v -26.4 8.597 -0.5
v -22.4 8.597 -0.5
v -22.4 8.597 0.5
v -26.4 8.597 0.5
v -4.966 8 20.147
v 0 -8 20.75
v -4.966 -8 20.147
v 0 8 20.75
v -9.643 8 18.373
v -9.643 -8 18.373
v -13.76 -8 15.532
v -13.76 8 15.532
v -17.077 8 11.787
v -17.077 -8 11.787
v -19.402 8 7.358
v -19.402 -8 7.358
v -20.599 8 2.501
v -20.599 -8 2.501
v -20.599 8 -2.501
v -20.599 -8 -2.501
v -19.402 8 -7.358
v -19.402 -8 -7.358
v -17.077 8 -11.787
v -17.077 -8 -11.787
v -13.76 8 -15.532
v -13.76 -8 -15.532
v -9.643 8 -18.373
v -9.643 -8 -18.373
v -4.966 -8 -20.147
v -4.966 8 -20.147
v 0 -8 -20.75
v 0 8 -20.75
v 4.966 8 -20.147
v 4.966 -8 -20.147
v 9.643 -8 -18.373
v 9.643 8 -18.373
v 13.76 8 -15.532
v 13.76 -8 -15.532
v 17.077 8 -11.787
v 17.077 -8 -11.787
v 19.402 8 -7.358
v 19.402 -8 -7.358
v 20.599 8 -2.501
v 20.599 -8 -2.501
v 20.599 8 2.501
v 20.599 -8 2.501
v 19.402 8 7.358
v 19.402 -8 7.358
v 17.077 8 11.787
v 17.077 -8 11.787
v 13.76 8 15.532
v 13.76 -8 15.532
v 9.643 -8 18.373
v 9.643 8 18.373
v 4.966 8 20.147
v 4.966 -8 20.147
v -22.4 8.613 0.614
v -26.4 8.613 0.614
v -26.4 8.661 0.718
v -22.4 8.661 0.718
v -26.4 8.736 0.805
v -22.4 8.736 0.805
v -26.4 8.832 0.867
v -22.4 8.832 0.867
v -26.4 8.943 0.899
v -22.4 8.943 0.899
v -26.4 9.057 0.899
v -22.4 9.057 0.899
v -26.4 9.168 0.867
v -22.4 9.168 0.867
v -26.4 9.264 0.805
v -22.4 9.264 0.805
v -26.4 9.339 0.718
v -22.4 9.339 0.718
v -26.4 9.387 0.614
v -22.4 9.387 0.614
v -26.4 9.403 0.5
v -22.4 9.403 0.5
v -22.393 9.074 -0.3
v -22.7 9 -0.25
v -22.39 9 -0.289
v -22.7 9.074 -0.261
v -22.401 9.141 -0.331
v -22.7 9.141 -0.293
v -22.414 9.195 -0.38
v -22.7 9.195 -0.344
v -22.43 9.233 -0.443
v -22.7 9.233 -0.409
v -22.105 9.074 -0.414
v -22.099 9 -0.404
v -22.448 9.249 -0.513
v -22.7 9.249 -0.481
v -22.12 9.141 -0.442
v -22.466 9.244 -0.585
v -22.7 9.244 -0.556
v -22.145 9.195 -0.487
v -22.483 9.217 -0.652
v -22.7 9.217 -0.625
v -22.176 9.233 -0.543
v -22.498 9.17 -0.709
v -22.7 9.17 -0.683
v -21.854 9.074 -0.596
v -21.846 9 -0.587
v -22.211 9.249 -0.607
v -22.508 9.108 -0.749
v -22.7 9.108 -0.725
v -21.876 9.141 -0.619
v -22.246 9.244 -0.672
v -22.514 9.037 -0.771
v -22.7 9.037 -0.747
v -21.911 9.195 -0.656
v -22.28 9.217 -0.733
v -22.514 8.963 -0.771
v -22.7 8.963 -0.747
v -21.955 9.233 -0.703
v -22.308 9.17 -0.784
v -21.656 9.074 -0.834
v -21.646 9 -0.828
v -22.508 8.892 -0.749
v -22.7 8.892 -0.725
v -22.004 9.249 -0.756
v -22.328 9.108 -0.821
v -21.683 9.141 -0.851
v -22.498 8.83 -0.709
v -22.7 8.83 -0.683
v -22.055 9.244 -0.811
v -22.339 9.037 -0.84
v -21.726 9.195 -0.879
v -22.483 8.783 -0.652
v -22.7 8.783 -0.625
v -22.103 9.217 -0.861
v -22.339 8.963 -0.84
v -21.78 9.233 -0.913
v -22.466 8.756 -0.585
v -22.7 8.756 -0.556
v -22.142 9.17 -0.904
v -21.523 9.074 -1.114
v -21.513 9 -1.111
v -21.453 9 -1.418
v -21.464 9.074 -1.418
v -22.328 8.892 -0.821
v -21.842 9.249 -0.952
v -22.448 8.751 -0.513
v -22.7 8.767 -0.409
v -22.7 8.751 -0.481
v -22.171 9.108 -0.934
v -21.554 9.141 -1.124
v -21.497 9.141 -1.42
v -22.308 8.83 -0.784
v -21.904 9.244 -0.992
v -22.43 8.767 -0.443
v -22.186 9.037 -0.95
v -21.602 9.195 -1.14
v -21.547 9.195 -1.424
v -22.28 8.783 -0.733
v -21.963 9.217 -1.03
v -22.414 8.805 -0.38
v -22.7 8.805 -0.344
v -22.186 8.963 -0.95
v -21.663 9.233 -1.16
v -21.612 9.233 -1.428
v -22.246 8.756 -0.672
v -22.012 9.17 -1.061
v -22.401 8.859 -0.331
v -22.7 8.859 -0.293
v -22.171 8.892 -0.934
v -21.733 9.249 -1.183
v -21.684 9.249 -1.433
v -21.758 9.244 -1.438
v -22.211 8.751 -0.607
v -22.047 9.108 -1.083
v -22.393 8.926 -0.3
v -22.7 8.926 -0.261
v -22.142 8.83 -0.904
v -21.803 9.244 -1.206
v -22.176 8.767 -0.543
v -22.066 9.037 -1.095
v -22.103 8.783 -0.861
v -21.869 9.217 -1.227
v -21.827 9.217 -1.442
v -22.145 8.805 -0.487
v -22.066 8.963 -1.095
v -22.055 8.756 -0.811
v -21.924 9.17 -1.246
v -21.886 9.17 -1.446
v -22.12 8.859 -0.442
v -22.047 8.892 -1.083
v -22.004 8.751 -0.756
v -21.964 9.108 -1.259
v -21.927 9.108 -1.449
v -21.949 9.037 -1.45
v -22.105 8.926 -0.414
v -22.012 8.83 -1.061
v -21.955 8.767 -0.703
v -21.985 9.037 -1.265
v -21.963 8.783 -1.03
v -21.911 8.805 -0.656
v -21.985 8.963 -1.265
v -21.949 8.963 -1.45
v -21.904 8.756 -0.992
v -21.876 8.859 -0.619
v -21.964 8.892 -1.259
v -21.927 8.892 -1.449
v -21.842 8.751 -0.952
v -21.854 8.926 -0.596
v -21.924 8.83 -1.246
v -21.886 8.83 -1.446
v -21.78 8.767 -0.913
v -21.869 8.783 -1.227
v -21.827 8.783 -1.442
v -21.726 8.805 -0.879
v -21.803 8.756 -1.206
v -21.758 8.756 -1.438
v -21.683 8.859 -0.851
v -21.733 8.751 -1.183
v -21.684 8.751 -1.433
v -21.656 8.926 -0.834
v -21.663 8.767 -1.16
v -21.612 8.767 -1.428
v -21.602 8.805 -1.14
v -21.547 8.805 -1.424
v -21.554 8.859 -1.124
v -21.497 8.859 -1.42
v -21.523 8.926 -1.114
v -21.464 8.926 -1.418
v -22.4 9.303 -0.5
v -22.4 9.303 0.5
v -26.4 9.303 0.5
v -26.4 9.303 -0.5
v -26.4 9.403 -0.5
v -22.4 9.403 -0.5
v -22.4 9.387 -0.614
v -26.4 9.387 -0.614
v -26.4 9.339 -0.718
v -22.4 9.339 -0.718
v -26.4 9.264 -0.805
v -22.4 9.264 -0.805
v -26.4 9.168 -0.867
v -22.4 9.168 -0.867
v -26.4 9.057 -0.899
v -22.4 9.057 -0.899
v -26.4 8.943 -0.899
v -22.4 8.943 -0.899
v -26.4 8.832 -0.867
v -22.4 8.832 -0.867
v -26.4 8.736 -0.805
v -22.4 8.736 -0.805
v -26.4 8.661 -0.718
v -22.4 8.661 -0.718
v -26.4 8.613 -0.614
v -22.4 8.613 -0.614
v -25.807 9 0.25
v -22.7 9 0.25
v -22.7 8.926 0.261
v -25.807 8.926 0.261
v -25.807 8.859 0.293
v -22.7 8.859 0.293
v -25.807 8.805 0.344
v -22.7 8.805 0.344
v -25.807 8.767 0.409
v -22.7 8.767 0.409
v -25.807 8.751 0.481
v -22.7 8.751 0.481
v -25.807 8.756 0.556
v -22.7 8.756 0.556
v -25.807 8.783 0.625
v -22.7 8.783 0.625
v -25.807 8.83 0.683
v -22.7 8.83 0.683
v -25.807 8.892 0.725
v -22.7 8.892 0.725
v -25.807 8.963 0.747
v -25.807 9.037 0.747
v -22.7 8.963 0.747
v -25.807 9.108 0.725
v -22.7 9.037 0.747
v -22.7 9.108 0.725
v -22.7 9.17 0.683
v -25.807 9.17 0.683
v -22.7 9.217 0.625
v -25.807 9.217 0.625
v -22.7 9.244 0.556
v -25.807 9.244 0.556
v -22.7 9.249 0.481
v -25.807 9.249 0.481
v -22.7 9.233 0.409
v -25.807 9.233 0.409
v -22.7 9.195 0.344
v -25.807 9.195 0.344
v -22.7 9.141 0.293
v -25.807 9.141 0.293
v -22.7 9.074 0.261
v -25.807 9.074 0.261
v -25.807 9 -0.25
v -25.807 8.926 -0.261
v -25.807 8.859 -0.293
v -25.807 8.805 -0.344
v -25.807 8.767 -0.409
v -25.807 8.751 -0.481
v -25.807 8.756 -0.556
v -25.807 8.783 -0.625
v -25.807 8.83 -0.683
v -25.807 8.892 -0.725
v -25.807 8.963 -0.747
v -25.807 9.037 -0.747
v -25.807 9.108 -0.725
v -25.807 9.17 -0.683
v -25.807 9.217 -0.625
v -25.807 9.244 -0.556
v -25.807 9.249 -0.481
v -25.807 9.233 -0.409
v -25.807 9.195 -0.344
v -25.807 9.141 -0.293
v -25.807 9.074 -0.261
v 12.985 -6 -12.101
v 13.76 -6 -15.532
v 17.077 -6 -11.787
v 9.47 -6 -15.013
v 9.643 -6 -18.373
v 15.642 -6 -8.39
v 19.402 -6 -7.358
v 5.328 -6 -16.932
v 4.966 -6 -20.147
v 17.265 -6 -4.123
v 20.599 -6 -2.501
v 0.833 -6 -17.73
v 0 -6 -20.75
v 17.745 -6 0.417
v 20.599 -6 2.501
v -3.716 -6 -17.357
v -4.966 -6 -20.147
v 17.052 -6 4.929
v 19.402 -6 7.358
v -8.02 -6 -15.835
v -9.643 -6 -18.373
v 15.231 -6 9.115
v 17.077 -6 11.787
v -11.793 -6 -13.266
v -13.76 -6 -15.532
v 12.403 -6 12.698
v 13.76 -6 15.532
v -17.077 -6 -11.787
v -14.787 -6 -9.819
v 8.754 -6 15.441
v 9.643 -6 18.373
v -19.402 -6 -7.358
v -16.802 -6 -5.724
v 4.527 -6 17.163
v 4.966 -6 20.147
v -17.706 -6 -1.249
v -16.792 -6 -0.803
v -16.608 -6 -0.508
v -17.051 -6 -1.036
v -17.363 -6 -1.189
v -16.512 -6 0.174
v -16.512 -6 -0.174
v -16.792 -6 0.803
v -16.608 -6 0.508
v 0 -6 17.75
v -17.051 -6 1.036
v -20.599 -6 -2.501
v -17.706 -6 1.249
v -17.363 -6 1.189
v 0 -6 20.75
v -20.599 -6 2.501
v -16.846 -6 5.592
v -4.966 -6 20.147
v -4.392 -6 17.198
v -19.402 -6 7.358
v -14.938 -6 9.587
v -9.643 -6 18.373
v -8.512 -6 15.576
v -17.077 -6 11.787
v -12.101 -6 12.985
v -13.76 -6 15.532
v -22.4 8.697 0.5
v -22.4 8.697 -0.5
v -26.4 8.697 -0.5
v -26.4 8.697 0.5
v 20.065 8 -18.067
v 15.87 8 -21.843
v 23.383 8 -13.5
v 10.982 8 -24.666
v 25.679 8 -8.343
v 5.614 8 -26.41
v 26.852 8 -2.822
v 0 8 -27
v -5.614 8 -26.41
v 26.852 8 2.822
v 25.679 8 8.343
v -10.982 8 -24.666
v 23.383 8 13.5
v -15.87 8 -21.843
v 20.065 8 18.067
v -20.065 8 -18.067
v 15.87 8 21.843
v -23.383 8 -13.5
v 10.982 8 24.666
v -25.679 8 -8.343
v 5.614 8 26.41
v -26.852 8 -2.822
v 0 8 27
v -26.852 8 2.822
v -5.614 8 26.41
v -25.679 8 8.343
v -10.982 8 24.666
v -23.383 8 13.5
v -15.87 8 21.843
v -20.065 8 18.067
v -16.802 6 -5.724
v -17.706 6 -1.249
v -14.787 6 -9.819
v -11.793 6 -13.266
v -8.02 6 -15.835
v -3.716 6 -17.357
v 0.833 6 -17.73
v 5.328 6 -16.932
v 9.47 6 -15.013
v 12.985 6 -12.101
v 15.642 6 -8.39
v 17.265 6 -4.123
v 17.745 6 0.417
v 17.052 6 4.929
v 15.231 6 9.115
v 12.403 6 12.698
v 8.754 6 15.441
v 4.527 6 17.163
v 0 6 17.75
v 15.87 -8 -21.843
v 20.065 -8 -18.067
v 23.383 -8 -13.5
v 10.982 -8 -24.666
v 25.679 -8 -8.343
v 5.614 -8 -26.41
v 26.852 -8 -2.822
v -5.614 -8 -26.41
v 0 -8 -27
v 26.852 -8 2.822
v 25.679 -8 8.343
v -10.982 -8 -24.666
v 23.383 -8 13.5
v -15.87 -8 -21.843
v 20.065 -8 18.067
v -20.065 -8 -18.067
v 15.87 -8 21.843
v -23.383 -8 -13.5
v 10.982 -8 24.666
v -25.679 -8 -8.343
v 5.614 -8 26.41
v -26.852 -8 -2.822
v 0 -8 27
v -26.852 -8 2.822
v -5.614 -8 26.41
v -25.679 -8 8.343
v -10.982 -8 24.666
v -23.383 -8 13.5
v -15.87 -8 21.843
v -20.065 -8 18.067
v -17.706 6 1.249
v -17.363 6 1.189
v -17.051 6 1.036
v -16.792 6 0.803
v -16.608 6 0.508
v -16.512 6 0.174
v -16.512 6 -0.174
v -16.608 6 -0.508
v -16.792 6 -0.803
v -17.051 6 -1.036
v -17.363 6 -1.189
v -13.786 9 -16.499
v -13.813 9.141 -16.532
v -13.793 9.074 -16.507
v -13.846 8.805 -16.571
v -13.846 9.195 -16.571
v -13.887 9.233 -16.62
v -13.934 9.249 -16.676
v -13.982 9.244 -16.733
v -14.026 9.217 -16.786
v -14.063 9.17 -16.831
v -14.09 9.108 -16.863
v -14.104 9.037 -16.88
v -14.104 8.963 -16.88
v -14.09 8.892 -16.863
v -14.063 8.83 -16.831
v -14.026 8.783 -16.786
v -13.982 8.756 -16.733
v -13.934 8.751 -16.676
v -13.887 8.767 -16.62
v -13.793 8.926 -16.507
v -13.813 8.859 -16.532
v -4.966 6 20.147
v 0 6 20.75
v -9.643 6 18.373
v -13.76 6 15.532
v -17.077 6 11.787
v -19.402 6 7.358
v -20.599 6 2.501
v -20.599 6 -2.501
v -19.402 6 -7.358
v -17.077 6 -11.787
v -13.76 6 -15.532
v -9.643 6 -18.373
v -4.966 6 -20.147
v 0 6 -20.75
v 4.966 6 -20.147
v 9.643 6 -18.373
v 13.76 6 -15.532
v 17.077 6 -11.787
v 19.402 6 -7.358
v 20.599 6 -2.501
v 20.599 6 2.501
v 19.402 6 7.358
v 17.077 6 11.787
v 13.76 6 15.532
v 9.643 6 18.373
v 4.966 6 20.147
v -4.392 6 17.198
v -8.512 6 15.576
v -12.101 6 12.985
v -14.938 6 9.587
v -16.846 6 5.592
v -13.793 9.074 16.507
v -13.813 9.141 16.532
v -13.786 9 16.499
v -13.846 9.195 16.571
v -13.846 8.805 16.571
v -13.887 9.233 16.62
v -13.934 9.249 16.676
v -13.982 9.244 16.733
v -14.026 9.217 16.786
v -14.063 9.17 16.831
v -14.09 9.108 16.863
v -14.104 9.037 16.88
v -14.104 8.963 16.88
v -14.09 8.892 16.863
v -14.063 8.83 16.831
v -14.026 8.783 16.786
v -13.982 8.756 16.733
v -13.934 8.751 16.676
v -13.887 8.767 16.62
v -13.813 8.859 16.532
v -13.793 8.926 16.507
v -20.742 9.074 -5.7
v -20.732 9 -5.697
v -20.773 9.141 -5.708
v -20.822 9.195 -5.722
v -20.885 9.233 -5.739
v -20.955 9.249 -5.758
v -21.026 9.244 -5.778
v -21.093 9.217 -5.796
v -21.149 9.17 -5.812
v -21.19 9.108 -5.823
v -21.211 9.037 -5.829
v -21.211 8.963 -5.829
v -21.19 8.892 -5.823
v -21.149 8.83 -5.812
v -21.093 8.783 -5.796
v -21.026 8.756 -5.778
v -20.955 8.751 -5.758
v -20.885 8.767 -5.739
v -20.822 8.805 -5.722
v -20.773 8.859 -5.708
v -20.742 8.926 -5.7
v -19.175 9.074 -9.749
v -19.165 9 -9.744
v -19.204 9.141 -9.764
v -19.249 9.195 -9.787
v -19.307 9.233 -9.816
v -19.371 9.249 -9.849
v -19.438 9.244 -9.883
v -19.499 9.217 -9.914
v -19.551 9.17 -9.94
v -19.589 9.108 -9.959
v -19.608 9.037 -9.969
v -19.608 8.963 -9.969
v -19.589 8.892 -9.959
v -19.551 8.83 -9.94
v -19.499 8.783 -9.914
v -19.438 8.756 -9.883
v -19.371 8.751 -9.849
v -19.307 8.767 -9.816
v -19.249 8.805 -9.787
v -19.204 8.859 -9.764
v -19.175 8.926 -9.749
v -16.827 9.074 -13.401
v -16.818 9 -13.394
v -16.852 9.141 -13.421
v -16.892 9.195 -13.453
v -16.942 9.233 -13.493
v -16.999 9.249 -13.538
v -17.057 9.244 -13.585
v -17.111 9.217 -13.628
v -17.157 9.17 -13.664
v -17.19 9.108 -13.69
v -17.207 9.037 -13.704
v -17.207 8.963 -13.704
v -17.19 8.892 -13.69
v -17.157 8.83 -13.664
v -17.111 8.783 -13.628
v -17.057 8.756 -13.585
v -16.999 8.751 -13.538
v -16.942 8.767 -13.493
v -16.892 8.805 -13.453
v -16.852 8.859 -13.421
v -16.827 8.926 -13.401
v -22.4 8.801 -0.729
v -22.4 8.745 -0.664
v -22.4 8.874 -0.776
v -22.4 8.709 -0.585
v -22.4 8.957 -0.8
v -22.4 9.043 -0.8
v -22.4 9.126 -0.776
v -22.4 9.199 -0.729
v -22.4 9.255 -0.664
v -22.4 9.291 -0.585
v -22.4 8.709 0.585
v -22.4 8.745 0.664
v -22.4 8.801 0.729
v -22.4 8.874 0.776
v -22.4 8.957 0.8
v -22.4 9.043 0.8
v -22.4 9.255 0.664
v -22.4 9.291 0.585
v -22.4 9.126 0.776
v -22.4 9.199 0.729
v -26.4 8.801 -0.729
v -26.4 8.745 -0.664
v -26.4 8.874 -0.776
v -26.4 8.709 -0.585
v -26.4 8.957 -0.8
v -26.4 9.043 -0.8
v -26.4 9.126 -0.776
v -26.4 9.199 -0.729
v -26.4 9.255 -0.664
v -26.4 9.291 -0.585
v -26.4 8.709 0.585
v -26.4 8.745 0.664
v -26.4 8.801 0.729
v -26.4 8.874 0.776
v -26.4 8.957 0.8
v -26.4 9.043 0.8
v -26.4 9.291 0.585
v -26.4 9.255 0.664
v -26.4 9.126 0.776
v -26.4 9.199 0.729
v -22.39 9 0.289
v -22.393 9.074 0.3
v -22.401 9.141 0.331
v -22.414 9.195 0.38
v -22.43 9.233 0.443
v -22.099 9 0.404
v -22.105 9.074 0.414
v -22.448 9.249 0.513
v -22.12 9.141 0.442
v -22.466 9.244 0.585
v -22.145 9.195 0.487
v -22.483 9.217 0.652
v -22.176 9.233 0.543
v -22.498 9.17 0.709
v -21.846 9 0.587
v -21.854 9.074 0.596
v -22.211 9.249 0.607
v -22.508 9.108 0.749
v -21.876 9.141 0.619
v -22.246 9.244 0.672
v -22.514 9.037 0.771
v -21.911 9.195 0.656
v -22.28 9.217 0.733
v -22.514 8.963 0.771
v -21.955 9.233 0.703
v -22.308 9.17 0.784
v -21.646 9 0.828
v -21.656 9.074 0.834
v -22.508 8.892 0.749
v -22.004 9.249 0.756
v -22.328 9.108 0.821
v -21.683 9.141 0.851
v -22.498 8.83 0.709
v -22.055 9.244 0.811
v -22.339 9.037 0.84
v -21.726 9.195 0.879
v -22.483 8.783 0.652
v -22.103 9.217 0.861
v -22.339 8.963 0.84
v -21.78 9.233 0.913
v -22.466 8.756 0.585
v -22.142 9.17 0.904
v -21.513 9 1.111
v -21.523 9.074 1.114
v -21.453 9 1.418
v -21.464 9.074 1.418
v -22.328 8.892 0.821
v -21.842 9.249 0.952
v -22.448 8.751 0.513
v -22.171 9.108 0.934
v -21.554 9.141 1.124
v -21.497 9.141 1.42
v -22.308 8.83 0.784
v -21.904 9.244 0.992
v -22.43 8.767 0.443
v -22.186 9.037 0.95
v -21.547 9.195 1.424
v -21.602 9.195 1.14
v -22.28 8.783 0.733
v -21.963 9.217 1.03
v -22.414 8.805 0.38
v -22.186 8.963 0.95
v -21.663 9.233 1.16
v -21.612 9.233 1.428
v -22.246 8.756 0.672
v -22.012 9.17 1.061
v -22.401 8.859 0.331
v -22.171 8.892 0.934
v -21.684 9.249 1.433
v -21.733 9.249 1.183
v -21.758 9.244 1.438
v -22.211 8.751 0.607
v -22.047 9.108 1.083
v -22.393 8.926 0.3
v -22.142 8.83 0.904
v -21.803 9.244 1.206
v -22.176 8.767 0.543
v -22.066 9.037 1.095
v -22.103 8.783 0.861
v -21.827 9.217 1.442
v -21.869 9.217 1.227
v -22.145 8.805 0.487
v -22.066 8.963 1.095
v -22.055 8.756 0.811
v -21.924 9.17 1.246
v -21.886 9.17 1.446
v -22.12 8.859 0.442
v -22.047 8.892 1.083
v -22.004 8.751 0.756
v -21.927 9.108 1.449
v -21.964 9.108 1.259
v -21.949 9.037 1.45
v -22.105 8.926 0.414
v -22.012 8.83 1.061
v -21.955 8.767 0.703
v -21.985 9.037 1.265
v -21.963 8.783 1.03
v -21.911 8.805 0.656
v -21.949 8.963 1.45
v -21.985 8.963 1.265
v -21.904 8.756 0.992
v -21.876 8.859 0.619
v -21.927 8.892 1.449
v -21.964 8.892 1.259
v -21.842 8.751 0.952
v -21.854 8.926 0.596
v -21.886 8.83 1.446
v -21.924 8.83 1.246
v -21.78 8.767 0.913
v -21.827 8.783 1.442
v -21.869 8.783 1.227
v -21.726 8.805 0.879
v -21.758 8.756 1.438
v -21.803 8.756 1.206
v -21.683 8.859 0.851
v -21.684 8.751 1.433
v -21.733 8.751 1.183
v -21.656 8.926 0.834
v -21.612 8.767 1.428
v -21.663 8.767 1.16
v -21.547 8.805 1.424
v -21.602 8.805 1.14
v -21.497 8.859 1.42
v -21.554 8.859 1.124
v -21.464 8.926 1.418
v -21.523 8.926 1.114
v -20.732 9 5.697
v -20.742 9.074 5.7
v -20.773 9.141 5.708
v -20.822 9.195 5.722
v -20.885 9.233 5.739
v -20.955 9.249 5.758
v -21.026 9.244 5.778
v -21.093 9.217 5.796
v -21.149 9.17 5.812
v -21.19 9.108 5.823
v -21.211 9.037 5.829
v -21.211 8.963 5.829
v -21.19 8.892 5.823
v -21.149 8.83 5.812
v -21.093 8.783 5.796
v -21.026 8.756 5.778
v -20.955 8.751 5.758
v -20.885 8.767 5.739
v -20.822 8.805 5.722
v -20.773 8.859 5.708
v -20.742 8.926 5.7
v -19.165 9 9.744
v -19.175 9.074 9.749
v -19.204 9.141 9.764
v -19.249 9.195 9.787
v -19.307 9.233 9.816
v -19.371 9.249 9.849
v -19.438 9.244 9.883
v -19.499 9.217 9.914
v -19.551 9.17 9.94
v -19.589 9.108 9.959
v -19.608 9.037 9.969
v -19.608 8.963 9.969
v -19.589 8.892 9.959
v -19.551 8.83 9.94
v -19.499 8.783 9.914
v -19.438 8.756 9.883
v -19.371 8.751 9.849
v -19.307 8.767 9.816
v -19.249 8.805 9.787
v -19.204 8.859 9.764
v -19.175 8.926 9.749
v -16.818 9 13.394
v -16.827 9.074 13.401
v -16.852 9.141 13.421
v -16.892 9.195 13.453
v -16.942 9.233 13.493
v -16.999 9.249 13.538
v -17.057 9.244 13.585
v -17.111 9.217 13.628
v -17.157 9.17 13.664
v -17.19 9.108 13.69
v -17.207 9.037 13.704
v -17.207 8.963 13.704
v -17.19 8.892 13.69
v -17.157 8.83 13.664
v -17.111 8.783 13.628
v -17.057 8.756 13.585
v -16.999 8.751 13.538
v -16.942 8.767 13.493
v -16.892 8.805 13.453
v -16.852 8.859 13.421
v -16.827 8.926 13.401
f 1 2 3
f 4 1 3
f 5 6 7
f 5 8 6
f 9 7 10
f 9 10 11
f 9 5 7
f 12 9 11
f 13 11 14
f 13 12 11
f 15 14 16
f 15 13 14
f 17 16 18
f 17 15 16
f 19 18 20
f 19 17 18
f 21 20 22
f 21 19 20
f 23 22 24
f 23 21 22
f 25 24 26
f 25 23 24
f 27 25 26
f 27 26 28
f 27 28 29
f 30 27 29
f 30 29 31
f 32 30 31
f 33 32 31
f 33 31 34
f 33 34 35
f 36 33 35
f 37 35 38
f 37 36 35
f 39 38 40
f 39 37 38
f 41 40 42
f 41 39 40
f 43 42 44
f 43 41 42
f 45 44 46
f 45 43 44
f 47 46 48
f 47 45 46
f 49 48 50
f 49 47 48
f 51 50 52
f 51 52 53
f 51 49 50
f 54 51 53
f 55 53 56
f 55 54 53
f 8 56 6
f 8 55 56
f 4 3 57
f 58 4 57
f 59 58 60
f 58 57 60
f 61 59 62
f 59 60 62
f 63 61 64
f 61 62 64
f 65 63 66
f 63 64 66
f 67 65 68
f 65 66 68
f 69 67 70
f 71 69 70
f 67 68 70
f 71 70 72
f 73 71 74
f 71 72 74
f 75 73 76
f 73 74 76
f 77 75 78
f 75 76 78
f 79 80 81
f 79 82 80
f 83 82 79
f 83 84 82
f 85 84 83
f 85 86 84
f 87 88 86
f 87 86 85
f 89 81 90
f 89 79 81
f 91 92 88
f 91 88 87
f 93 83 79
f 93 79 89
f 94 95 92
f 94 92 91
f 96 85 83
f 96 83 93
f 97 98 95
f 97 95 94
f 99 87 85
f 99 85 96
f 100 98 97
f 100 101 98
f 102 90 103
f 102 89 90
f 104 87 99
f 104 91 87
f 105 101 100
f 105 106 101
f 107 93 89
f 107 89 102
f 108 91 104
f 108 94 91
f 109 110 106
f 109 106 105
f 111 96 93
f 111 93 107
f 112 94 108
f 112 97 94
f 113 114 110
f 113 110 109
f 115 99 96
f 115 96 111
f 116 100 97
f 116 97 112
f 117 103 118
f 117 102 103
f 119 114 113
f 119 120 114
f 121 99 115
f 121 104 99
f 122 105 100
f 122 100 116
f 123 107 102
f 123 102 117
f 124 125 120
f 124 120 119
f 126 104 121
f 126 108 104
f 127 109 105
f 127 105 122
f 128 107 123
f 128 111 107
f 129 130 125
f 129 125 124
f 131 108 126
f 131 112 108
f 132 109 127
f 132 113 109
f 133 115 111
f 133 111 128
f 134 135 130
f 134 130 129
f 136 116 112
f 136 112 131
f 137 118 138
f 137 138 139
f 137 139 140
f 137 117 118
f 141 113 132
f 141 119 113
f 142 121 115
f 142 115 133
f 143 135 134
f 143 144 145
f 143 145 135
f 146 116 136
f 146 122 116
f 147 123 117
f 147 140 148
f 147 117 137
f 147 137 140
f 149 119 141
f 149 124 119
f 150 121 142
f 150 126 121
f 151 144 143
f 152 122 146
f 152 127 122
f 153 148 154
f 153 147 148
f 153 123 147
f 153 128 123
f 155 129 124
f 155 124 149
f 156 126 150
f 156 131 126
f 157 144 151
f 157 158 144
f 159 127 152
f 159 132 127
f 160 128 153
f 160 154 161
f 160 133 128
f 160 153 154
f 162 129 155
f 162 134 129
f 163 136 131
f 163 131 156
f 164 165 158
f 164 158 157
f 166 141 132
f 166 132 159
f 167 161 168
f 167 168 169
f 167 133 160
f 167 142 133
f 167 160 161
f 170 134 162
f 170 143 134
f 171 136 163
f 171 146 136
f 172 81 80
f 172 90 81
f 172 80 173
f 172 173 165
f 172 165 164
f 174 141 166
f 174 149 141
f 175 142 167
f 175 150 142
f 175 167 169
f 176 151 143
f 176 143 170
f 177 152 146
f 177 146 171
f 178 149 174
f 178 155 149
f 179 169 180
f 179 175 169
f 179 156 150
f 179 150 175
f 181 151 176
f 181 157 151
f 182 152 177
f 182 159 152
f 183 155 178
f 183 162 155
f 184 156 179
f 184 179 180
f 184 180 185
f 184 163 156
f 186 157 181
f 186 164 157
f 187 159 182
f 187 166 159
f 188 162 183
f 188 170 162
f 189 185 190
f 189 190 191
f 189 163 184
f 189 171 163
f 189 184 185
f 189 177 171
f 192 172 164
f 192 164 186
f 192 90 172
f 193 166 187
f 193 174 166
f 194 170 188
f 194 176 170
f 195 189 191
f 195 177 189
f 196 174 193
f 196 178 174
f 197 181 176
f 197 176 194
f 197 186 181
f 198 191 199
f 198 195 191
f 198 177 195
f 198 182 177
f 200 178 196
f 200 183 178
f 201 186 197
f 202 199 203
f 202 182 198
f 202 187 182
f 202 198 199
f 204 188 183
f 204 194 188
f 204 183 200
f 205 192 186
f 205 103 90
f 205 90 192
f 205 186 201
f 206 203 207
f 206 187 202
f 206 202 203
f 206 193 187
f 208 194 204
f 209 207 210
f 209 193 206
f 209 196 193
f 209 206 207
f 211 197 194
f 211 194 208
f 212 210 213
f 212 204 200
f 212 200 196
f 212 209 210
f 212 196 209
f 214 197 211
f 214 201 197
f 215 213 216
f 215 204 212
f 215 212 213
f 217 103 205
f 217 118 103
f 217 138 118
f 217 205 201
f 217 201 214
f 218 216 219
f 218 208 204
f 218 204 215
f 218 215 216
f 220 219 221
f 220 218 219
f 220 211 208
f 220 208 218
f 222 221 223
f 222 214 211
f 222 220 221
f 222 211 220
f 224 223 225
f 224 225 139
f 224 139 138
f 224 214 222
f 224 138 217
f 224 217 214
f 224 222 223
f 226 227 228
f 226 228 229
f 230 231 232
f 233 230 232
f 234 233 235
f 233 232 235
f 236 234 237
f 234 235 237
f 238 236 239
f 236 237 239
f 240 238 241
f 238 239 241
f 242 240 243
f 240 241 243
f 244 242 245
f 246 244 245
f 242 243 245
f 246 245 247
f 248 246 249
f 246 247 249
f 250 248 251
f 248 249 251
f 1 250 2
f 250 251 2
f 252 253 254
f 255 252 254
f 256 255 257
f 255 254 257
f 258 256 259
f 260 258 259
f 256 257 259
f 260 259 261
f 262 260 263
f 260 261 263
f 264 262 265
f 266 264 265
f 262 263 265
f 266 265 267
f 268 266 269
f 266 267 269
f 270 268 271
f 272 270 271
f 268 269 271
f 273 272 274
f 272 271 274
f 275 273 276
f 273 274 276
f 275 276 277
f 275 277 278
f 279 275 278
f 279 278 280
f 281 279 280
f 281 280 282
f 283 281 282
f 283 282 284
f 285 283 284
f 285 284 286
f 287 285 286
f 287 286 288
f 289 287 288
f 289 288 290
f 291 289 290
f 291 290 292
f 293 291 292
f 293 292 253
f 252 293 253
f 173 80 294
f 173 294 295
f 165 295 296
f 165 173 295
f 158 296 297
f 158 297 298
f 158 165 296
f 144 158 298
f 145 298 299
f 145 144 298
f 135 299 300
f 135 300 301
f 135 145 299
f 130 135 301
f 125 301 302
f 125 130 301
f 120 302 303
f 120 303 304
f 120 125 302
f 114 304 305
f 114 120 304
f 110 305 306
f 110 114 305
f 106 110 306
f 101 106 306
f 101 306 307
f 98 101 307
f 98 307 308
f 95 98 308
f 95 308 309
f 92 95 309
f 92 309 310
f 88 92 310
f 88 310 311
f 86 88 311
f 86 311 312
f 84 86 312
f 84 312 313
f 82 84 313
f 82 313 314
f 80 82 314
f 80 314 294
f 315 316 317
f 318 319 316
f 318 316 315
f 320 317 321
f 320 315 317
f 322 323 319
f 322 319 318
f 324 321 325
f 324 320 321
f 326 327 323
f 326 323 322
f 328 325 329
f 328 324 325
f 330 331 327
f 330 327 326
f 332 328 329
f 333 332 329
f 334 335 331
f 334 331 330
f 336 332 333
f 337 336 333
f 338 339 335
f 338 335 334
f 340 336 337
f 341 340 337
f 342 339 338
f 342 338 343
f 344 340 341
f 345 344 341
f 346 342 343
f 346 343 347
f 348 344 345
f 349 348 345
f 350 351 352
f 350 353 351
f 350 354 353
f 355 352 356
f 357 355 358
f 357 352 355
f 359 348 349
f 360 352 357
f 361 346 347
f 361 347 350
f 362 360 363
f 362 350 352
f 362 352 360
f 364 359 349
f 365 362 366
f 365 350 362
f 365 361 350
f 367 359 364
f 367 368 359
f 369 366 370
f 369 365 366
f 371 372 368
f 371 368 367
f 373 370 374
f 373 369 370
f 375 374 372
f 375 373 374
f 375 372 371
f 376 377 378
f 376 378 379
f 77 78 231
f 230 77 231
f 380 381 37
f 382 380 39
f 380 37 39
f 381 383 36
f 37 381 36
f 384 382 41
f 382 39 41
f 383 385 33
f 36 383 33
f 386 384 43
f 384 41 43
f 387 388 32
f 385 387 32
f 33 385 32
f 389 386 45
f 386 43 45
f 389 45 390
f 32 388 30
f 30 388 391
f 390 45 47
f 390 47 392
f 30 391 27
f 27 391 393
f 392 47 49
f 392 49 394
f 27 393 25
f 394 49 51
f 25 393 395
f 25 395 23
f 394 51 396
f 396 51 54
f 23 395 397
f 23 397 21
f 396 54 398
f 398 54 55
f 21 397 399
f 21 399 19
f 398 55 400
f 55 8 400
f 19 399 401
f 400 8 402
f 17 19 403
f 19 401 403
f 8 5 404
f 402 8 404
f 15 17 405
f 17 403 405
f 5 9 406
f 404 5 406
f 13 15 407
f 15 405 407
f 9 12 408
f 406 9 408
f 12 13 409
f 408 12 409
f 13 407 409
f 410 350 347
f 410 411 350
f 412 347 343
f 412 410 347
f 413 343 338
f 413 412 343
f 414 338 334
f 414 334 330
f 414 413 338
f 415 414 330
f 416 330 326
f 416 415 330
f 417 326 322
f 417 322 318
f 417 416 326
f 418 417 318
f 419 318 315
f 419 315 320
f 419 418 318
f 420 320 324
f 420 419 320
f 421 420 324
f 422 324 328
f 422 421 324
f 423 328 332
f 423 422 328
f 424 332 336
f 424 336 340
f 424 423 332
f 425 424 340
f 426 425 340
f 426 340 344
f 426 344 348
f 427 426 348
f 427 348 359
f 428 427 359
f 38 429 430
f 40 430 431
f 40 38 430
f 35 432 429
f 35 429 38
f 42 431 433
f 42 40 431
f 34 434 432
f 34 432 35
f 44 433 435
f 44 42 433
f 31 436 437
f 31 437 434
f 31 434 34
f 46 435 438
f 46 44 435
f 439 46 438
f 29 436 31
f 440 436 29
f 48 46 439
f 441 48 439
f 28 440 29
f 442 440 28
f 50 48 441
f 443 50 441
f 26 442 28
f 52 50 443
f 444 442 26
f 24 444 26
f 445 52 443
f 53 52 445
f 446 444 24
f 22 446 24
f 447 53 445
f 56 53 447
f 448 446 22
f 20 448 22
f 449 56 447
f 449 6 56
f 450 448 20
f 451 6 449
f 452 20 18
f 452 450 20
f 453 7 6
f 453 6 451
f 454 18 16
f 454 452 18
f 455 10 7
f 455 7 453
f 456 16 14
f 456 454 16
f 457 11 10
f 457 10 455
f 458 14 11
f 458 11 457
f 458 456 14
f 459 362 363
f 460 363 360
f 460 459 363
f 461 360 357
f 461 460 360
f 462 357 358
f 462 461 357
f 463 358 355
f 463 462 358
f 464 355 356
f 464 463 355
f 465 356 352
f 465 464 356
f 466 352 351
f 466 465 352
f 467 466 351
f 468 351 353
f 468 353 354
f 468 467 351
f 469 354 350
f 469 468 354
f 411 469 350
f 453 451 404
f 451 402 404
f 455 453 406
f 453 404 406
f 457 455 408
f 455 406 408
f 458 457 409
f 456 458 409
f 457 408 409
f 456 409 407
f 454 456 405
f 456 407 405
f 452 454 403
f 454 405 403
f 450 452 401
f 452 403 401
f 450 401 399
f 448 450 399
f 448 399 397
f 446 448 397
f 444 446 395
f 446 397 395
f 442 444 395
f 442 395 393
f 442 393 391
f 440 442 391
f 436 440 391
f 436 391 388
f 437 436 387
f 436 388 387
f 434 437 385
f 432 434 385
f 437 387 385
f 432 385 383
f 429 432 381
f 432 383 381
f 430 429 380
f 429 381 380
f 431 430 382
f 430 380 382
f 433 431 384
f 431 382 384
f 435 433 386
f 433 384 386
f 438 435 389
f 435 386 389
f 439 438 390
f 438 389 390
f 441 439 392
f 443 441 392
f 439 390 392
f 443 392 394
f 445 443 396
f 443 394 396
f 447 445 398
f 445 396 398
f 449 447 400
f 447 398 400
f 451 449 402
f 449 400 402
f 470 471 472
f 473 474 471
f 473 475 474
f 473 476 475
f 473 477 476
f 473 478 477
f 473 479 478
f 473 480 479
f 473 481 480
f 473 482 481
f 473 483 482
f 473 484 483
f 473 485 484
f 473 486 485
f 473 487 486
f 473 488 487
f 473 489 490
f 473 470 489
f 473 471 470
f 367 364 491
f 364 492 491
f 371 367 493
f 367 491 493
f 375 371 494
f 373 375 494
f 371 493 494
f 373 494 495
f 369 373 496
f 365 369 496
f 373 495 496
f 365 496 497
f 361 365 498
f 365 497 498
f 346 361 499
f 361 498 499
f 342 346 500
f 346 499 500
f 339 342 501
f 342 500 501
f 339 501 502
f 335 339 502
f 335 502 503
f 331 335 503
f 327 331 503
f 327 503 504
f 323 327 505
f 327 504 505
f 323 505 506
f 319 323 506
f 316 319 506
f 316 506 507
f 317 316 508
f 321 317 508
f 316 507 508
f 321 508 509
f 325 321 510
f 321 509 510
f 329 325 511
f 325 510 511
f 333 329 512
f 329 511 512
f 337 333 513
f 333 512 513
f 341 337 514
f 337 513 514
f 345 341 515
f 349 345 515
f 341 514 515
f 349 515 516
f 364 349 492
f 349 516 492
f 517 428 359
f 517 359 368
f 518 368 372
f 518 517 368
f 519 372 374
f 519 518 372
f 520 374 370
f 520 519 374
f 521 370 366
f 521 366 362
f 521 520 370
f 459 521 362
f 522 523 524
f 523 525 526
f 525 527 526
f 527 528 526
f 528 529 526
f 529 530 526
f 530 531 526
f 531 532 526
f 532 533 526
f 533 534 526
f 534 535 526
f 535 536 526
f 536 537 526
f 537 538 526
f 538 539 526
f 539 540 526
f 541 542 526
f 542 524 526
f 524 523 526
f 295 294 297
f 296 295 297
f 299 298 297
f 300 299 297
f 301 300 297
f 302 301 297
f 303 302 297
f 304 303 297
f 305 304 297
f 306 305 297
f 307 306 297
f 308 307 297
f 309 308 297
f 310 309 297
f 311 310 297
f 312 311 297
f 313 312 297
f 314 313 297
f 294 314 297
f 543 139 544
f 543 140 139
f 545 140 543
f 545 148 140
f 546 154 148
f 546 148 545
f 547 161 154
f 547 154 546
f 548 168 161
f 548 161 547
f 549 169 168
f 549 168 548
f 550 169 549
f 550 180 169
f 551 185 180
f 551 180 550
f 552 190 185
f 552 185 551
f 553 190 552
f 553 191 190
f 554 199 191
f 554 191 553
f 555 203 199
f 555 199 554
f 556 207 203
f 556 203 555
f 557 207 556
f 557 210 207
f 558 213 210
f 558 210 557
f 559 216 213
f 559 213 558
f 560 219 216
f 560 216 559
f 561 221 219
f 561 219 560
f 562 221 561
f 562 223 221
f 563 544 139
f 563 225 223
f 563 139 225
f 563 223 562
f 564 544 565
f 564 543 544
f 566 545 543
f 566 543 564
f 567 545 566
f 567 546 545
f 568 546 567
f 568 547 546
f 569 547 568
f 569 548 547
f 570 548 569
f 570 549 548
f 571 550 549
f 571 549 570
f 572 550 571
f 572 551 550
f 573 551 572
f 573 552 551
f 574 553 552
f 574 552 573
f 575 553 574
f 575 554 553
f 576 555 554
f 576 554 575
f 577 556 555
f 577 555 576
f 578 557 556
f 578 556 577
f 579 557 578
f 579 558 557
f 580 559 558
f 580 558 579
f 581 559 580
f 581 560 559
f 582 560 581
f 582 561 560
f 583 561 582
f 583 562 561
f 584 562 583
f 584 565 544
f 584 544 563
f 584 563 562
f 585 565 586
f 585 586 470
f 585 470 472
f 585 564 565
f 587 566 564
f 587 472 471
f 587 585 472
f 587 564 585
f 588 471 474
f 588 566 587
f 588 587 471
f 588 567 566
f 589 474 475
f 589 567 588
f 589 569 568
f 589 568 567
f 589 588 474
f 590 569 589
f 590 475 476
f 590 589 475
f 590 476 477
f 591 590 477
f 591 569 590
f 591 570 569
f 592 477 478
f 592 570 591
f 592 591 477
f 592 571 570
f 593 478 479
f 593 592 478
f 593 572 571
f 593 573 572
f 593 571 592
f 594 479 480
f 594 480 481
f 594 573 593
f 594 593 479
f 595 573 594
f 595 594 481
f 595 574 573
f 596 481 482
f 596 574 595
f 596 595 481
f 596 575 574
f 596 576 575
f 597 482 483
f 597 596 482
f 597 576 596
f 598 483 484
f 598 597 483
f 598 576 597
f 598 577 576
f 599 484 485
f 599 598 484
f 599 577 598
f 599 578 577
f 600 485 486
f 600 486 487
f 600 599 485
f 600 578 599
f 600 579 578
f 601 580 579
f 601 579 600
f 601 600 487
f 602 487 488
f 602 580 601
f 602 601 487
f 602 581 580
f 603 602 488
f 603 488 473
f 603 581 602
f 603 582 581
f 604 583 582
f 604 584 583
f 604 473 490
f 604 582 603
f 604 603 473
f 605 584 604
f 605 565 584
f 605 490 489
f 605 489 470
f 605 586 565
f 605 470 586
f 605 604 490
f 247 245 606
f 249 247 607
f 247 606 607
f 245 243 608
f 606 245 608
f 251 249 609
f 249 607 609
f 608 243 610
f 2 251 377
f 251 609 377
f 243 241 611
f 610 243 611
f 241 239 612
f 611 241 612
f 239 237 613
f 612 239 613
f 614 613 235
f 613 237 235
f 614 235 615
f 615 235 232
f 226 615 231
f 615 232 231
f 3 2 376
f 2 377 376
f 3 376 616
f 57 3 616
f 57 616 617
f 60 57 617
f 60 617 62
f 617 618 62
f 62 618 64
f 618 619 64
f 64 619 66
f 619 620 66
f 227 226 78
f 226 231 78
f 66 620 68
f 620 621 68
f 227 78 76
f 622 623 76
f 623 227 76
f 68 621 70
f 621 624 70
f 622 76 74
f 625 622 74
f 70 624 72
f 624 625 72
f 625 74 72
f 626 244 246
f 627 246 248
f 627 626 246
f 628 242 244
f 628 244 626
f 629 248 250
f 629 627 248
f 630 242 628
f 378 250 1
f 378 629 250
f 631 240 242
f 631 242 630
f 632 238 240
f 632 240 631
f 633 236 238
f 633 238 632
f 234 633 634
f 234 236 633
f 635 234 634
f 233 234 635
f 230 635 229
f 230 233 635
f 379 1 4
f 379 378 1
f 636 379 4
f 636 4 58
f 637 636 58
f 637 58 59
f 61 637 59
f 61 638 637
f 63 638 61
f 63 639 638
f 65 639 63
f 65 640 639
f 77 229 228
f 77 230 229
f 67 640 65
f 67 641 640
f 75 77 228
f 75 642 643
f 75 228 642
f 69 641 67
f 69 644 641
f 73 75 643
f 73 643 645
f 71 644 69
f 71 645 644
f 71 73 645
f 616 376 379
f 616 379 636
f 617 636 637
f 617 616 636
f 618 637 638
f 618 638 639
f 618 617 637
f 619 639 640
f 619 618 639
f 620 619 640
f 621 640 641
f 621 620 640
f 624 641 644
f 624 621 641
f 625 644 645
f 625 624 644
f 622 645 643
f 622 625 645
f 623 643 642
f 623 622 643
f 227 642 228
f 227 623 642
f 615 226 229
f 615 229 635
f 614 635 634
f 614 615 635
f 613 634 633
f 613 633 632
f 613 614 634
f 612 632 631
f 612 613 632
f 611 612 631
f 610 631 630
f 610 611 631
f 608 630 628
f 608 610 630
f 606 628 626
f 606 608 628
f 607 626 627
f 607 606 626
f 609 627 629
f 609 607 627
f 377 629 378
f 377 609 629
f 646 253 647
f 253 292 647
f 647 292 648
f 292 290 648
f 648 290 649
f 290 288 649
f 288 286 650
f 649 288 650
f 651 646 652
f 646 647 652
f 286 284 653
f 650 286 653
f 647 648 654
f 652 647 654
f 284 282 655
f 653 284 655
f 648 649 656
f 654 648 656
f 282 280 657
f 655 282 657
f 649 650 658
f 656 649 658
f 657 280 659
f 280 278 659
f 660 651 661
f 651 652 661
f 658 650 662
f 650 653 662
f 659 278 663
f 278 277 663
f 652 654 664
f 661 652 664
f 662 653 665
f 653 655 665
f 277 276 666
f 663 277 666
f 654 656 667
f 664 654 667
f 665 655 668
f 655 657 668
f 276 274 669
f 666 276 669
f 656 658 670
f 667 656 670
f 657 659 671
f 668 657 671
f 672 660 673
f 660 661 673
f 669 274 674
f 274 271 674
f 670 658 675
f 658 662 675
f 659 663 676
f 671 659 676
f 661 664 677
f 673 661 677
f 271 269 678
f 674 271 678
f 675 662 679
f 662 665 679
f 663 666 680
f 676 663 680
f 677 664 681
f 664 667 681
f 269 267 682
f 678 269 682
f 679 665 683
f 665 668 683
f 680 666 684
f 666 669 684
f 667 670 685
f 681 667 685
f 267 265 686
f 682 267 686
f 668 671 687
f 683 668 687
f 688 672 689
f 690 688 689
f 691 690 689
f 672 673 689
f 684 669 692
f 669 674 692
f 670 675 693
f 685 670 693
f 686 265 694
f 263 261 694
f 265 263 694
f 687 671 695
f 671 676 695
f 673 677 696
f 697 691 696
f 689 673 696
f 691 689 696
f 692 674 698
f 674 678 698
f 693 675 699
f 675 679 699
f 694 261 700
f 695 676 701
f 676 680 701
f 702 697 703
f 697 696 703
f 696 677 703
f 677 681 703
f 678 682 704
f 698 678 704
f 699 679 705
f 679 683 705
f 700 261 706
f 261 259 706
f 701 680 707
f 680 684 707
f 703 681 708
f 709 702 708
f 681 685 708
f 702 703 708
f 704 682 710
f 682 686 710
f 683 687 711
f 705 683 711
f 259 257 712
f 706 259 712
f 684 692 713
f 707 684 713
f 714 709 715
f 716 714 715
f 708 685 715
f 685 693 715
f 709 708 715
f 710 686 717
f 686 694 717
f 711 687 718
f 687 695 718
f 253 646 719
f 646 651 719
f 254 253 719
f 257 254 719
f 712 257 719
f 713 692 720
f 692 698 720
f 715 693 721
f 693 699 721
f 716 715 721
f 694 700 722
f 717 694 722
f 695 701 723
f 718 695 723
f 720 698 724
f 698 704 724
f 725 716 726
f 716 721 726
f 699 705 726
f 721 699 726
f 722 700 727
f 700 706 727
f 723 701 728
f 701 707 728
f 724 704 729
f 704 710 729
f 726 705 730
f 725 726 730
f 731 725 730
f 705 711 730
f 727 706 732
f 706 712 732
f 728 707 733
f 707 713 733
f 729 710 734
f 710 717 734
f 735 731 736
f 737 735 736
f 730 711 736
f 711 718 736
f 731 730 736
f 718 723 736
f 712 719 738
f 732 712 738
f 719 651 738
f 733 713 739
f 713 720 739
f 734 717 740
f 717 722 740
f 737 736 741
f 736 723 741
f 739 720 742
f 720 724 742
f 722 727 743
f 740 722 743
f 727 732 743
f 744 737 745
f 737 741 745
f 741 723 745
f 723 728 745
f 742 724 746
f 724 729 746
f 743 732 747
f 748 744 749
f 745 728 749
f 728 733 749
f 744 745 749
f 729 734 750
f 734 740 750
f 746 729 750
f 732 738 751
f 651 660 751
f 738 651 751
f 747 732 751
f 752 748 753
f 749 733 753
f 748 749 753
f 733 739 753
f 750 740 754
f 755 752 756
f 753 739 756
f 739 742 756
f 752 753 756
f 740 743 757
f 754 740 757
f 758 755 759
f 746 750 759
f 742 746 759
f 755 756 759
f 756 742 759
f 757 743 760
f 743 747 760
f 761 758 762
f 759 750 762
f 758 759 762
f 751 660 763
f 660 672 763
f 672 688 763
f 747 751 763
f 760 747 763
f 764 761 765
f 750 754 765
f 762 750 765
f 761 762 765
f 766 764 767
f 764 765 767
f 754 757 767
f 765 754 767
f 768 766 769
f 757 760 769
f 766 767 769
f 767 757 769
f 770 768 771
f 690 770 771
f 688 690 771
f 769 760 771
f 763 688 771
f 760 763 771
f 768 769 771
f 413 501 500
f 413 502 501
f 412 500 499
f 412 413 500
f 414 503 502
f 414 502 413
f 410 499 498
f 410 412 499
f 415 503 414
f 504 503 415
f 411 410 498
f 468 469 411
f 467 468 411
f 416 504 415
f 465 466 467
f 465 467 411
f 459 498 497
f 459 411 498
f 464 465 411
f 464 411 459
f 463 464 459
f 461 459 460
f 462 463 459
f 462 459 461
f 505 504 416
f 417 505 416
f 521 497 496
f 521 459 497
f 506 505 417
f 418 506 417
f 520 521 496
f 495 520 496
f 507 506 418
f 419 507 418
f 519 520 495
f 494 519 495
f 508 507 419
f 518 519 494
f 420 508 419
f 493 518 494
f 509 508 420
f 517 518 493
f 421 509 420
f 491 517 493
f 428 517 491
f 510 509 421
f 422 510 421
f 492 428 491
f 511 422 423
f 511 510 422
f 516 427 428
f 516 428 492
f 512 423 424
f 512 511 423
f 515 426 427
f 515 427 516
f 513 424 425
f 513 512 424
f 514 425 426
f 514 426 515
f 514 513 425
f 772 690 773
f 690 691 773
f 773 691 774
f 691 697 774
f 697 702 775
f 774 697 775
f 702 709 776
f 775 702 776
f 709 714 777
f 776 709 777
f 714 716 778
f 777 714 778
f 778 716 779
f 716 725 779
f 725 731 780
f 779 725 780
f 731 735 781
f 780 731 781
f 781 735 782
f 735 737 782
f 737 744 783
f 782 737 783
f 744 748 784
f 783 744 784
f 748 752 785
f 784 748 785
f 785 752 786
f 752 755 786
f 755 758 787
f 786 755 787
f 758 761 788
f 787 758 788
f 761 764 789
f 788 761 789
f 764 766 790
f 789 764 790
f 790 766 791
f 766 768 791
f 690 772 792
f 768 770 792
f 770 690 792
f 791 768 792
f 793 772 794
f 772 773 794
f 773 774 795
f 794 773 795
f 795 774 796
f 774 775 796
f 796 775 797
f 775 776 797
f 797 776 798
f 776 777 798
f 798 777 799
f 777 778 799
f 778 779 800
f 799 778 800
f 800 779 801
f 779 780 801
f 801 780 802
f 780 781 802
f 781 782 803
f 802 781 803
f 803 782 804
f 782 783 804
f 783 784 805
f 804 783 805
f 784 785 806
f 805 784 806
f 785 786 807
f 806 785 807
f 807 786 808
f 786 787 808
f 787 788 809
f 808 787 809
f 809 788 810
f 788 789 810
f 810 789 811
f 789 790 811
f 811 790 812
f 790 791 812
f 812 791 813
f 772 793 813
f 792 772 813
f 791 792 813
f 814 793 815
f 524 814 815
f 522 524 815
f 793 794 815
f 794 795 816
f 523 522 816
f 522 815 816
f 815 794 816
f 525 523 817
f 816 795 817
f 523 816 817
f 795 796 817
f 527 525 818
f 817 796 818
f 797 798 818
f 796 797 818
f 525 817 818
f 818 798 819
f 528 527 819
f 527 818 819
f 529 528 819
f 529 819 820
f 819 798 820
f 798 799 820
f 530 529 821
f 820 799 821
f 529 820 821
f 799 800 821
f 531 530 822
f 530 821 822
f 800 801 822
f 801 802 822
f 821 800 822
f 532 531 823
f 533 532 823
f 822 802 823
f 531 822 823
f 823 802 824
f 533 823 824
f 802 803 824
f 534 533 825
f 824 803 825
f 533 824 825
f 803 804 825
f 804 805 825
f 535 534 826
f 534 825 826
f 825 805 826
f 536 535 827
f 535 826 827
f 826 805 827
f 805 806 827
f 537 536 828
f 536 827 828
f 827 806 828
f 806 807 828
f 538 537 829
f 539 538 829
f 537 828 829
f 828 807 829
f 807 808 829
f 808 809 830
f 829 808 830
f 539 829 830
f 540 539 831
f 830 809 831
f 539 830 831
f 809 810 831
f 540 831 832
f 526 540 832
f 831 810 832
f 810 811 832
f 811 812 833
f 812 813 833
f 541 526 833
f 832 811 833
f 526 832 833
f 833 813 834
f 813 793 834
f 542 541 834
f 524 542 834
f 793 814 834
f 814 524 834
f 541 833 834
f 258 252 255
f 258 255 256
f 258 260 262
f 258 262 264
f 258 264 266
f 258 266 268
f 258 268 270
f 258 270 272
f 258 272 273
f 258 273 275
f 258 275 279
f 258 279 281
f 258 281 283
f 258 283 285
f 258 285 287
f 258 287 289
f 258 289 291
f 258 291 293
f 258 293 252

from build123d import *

# Parameters (mm, degrees)
SKETCH1_W                       = 3
SKETCH1_H                       = 12
SKETCH2_W                       = 6.25
SKETCH2_H                       = 16
BOSS_EXTRUDE1_REACH             = 41.013
SKETCH3_R                       = 1.25
BOSS_EXTRUDE1_DIRECTION_2_REACH = 41.013
SWEEP1_PROFILE_R                = 0.25
EXTRUDE_THIN1_START             = -22.4
EXTRUDE_THIN1_DEPTH             = 4


with BuildPart() as part:
    # Sketch1 → Revolve1 (revolve)
    with BuildSketch(Plane.XY):
        with Locations((-19.25, 0)):
            Rectangle(SKETCH1_W, SKETCH1_H)
    revolve(axis=Axis((0, 0, 0), (0, -1, 0)))

    # Boss-Extrude1: up to this face of the body (flat: up to its plane)
    boss_extrude1_end = Plane(part.part.faces().sort_by_distance((20.163101372, 6, 0))[0])
    # Sketch3 → Boss-Extrude1 (add, up to the picked face)
    with BuildSketch(Plane(origin=(0, 0, 0), x_dir=(1, 0, 0), z_dir=(0, 1, 0)), mode=Mode.PRIVATE) as boss_extrude1_sk1:
        with Locations((-17.75, 0)):
            Circle(SKETCH3_R)
    boss_extrude1_tool1 = split(extrude(boss_extrude1_sk1.sketch, amount=BOSS_EXTRUDE1_REACH, mode=Mode.PRIVATE), bisect_by=boss_extrude1_end, keep=Keep.BOTH, mode=Mode.PRIVATE)
    add(boss_extrude1_tool1.solids().sort_by(Axis((-17.75, 0, 0), (0, 1, 0)))[0])

    # Boss-Extrude1 direction 2: up to this face of the body (flat: up to its plane)
    boss_extrude1_direction_2_end = Plane(part.part.faces().sort_by_distance((18.336898628, -6, 0))[0])
    # Sketch3 → Boss-Extrude1 direction 2 (add, up to the picked face)
    with BuildSketch(Plane(origin=(0, 0, 0), x_dir=(1, 0, 0), z_dir=(0, 1, 0)), mode=Mode.PRIVATE) as boss_extrude1_direction_2_sk1:
        with Locations((-17.75, 0)):
            Circle(SKETCH3_R)
    boss_extrude1_direction_2_tool1 = split(extrude(boss_extrude1_direction_2_sk1.sketch, amount=-BOSS_EXTRUDE1_DIRECTION_2_REACH, mode=Mode.PRIVATE), bisect_by=boss_extrude1_direction_2_end, keep=Keep.BOTH, mode=Mode.PRIVATE)
    add(boss_extrude1_direction_2_tool1.solids().sort_by(Axis((-17.75, 0, 0), (0, -1, 0)))[0])


with BuildPart() as body_2:
    # Sketch2 → Revolve2 (revolve)
    with BuildSketch(Plane.XY):
        with Locations((-23.875, 0)):
            Rectangle(SKETCH2_W, SKETCH2_H)
    revolve(axis=Axis((0, 0, 0), (0, -1, 0)))


with BuildPart() as body_3:
    # Sweep1: sweep along a path in Sketch4
    with BuildLine(Plane(origin=(0, 9, 0), x_dir=(1, 0, 0), z_dir=(0, 1, 0))) as sweep1_path:
        Line((-25.807382336, 0.5), (-22.700495589, 0.5))
        ThreePointArc((-22.700495589, 0.5), (-22.017097486, 0.769954088), (-21.702671607, 1.434065934))
        ThreePointArc((-21.702671607, 1.434065934), (-19.388013922, 9.857353405), (-13.945888, 16.690557447))
    # Sweep1 profile (on start of the path) → Sweep1 (sweep)
    with BuildSketch(Plane(origin=(-25.807382336, 9, -0.5), x_dir=(0, 0, 1), z_dir=(1, 0, 0))):
        Circle(SWEEP1_PROFILE_R)
    sweep(path=sweep1_path.line)


with BuildPart() as body_4:
    # Mirror2: mirrored copy
    add(body_3.part.mirror(Plane.XY))


with BuildPart() as body_5:
    # Sketch23 → Extrude-Thin1 (new body)
    with BuildSketch(Plane(origin=(0, 0, 0), x_dir=(0, 0, -1), z_dir=(1, 0, 0)).offset(EXTRUDE_THIN1_START)):
        with BuildLine():
            Line((-0.5, 9.403274162), (0.5, 9.403274162))
            ThreePointArc((0.5, 9.403274162), (0.903274162, 9), (0.5, 8.596725838))
            Line((0.5, 8.596725838), (-0.5, 8.596725838))
            ThreePointArc((-0.5, 8.596725838), (-0.903274162, 9), (-0.5, 9.403274162))
        make_face()
        with BuildLine():
            Line((-0.5, 9.303274162), (0.5, 9.303274162))
            ThreePointArc((0.5, 9.303274162), (0.803274162, 9), (0.5, 8.696725838))
            Line((0.5, 8.696725838), (-0.5, 8.696725838))
            ThreePointArc((-0.5, 8.696725838), (-0.803274162, 9), (-0.5, 9.303274162))
        make_face(mode=Mode.SUBTRACT)
    extrude(amount=-EXTRUDE_THIN1_DEPTH)


solid = Compound([part.part, body_2.part, body_3.part, body_4.part, body_5.part])
